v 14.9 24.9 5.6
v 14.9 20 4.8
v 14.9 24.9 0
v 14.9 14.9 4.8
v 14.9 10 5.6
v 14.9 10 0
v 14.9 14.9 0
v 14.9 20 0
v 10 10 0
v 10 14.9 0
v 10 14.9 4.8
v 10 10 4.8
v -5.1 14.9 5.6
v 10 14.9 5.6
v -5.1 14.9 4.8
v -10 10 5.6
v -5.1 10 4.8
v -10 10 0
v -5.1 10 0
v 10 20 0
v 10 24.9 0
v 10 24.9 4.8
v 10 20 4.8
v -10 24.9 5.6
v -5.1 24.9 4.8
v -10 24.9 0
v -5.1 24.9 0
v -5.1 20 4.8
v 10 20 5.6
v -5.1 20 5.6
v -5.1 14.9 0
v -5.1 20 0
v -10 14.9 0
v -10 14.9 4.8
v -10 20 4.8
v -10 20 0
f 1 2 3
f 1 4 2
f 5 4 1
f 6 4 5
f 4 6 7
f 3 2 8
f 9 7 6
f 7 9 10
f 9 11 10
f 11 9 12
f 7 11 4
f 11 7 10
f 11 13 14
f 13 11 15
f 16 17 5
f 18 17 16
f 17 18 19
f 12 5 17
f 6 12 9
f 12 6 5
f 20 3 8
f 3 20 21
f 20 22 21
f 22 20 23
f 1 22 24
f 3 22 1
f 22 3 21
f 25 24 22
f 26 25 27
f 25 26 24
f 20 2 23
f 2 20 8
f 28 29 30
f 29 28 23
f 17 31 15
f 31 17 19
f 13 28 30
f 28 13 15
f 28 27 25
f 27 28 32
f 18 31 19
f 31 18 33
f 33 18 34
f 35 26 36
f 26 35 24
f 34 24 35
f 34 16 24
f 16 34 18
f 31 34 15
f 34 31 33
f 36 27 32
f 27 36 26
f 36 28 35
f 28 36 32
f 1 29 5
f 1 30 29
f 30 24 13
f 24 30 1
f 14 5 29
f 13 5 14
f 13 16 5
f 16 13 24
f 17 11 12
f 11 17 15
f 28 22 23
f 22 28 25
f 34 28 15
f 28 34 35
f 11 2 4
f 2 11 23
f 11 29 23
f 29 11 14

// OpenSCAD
$fn = 90;

hs = 5; // hole size w, h, d
cs = 4.9; // connector size, w, h
ct = 0.8; // connector tape thickness

noHandle = true;

!translate([-hs * 2, hs * 2, 0]) connector();
#waffels();

module connector() {
    // Cubes
    translate([0, 0, 0]) cube([cs, cs, cs]);
    translate([0, hs * 2, 0]) cube([cs, cs, cs]);
    translate([hs * 4, 0, 0]) {
        translate([0, 0, 0]) cube([cs, cs, cs]);
        translate([0, hs * 2, 0]) cube([cs, cs, cs]);
    }
    
    // Tapes
    translate([0, 0, cs - 0.1]) cube([hs * 5 - 0.1, cs, ct]);
    translate([0, hs * 2, cs - 0.1]) cube([hs * 5 - 0.1, cs, ct]);
    
    translate([0, 0, cs - 0.1]) cube([cs, hs * 2 + 0.1, ct]);
    translate([hs * 4, 0, cs - 0.1]) cube([cs, hs * 2 + 0.1, ct]);
    
    if (!noHandle) {
        // Handle
        translate([-hs, hs, cs + 0.1]) handle();
        translate([hs * 6, hs * 2, cs + 0.1]) rotate([0, 0, 180]) handle();
        
    }
    
    module handle() {
        difference() {
            cube([hs, cs, ct - 0.3]);
            {
                rotate([90, 0, 0]) {
                    for (a = [0:4]) {
                        translate([a, -0.1, -7]) cylinder(h = 10, r = 0.25);
                        translate([a, 0.65, -7]) cylinder(h = 10, r = 0.25);
                    }
                }
            }
        }
    }
}

module waffels() {
    translate([0, 0, 0]) waffel();
    translate([hs - 0.1, 0, 0]) rotate([0, 0, 90]) waffel();
}

module waffel() {

    a = [
        [0, 1, 0, 1, 0, 1, 0],
        [0, 1, 1, 1, 1, 1, 0],
        [1, 1, 0, 1, 0, 1, 1],
        [0, 1, 1, 1, 1, 1, 0],
        [1, 1, 0, 1, 0, 1, 1],
        [0, 1, 1, 1, 1, 1, 0],
        [0, 1, 0, 1, 0, 1, 0]
    ];
    
    for (y = [0:7]) {        
        for (x = [0:7]) {
            if (a[y][x] == 1) {
              translate([hs * x, hs * y, 0]) cube([hs, hs, hs]);  
            }
        }
    }
}
